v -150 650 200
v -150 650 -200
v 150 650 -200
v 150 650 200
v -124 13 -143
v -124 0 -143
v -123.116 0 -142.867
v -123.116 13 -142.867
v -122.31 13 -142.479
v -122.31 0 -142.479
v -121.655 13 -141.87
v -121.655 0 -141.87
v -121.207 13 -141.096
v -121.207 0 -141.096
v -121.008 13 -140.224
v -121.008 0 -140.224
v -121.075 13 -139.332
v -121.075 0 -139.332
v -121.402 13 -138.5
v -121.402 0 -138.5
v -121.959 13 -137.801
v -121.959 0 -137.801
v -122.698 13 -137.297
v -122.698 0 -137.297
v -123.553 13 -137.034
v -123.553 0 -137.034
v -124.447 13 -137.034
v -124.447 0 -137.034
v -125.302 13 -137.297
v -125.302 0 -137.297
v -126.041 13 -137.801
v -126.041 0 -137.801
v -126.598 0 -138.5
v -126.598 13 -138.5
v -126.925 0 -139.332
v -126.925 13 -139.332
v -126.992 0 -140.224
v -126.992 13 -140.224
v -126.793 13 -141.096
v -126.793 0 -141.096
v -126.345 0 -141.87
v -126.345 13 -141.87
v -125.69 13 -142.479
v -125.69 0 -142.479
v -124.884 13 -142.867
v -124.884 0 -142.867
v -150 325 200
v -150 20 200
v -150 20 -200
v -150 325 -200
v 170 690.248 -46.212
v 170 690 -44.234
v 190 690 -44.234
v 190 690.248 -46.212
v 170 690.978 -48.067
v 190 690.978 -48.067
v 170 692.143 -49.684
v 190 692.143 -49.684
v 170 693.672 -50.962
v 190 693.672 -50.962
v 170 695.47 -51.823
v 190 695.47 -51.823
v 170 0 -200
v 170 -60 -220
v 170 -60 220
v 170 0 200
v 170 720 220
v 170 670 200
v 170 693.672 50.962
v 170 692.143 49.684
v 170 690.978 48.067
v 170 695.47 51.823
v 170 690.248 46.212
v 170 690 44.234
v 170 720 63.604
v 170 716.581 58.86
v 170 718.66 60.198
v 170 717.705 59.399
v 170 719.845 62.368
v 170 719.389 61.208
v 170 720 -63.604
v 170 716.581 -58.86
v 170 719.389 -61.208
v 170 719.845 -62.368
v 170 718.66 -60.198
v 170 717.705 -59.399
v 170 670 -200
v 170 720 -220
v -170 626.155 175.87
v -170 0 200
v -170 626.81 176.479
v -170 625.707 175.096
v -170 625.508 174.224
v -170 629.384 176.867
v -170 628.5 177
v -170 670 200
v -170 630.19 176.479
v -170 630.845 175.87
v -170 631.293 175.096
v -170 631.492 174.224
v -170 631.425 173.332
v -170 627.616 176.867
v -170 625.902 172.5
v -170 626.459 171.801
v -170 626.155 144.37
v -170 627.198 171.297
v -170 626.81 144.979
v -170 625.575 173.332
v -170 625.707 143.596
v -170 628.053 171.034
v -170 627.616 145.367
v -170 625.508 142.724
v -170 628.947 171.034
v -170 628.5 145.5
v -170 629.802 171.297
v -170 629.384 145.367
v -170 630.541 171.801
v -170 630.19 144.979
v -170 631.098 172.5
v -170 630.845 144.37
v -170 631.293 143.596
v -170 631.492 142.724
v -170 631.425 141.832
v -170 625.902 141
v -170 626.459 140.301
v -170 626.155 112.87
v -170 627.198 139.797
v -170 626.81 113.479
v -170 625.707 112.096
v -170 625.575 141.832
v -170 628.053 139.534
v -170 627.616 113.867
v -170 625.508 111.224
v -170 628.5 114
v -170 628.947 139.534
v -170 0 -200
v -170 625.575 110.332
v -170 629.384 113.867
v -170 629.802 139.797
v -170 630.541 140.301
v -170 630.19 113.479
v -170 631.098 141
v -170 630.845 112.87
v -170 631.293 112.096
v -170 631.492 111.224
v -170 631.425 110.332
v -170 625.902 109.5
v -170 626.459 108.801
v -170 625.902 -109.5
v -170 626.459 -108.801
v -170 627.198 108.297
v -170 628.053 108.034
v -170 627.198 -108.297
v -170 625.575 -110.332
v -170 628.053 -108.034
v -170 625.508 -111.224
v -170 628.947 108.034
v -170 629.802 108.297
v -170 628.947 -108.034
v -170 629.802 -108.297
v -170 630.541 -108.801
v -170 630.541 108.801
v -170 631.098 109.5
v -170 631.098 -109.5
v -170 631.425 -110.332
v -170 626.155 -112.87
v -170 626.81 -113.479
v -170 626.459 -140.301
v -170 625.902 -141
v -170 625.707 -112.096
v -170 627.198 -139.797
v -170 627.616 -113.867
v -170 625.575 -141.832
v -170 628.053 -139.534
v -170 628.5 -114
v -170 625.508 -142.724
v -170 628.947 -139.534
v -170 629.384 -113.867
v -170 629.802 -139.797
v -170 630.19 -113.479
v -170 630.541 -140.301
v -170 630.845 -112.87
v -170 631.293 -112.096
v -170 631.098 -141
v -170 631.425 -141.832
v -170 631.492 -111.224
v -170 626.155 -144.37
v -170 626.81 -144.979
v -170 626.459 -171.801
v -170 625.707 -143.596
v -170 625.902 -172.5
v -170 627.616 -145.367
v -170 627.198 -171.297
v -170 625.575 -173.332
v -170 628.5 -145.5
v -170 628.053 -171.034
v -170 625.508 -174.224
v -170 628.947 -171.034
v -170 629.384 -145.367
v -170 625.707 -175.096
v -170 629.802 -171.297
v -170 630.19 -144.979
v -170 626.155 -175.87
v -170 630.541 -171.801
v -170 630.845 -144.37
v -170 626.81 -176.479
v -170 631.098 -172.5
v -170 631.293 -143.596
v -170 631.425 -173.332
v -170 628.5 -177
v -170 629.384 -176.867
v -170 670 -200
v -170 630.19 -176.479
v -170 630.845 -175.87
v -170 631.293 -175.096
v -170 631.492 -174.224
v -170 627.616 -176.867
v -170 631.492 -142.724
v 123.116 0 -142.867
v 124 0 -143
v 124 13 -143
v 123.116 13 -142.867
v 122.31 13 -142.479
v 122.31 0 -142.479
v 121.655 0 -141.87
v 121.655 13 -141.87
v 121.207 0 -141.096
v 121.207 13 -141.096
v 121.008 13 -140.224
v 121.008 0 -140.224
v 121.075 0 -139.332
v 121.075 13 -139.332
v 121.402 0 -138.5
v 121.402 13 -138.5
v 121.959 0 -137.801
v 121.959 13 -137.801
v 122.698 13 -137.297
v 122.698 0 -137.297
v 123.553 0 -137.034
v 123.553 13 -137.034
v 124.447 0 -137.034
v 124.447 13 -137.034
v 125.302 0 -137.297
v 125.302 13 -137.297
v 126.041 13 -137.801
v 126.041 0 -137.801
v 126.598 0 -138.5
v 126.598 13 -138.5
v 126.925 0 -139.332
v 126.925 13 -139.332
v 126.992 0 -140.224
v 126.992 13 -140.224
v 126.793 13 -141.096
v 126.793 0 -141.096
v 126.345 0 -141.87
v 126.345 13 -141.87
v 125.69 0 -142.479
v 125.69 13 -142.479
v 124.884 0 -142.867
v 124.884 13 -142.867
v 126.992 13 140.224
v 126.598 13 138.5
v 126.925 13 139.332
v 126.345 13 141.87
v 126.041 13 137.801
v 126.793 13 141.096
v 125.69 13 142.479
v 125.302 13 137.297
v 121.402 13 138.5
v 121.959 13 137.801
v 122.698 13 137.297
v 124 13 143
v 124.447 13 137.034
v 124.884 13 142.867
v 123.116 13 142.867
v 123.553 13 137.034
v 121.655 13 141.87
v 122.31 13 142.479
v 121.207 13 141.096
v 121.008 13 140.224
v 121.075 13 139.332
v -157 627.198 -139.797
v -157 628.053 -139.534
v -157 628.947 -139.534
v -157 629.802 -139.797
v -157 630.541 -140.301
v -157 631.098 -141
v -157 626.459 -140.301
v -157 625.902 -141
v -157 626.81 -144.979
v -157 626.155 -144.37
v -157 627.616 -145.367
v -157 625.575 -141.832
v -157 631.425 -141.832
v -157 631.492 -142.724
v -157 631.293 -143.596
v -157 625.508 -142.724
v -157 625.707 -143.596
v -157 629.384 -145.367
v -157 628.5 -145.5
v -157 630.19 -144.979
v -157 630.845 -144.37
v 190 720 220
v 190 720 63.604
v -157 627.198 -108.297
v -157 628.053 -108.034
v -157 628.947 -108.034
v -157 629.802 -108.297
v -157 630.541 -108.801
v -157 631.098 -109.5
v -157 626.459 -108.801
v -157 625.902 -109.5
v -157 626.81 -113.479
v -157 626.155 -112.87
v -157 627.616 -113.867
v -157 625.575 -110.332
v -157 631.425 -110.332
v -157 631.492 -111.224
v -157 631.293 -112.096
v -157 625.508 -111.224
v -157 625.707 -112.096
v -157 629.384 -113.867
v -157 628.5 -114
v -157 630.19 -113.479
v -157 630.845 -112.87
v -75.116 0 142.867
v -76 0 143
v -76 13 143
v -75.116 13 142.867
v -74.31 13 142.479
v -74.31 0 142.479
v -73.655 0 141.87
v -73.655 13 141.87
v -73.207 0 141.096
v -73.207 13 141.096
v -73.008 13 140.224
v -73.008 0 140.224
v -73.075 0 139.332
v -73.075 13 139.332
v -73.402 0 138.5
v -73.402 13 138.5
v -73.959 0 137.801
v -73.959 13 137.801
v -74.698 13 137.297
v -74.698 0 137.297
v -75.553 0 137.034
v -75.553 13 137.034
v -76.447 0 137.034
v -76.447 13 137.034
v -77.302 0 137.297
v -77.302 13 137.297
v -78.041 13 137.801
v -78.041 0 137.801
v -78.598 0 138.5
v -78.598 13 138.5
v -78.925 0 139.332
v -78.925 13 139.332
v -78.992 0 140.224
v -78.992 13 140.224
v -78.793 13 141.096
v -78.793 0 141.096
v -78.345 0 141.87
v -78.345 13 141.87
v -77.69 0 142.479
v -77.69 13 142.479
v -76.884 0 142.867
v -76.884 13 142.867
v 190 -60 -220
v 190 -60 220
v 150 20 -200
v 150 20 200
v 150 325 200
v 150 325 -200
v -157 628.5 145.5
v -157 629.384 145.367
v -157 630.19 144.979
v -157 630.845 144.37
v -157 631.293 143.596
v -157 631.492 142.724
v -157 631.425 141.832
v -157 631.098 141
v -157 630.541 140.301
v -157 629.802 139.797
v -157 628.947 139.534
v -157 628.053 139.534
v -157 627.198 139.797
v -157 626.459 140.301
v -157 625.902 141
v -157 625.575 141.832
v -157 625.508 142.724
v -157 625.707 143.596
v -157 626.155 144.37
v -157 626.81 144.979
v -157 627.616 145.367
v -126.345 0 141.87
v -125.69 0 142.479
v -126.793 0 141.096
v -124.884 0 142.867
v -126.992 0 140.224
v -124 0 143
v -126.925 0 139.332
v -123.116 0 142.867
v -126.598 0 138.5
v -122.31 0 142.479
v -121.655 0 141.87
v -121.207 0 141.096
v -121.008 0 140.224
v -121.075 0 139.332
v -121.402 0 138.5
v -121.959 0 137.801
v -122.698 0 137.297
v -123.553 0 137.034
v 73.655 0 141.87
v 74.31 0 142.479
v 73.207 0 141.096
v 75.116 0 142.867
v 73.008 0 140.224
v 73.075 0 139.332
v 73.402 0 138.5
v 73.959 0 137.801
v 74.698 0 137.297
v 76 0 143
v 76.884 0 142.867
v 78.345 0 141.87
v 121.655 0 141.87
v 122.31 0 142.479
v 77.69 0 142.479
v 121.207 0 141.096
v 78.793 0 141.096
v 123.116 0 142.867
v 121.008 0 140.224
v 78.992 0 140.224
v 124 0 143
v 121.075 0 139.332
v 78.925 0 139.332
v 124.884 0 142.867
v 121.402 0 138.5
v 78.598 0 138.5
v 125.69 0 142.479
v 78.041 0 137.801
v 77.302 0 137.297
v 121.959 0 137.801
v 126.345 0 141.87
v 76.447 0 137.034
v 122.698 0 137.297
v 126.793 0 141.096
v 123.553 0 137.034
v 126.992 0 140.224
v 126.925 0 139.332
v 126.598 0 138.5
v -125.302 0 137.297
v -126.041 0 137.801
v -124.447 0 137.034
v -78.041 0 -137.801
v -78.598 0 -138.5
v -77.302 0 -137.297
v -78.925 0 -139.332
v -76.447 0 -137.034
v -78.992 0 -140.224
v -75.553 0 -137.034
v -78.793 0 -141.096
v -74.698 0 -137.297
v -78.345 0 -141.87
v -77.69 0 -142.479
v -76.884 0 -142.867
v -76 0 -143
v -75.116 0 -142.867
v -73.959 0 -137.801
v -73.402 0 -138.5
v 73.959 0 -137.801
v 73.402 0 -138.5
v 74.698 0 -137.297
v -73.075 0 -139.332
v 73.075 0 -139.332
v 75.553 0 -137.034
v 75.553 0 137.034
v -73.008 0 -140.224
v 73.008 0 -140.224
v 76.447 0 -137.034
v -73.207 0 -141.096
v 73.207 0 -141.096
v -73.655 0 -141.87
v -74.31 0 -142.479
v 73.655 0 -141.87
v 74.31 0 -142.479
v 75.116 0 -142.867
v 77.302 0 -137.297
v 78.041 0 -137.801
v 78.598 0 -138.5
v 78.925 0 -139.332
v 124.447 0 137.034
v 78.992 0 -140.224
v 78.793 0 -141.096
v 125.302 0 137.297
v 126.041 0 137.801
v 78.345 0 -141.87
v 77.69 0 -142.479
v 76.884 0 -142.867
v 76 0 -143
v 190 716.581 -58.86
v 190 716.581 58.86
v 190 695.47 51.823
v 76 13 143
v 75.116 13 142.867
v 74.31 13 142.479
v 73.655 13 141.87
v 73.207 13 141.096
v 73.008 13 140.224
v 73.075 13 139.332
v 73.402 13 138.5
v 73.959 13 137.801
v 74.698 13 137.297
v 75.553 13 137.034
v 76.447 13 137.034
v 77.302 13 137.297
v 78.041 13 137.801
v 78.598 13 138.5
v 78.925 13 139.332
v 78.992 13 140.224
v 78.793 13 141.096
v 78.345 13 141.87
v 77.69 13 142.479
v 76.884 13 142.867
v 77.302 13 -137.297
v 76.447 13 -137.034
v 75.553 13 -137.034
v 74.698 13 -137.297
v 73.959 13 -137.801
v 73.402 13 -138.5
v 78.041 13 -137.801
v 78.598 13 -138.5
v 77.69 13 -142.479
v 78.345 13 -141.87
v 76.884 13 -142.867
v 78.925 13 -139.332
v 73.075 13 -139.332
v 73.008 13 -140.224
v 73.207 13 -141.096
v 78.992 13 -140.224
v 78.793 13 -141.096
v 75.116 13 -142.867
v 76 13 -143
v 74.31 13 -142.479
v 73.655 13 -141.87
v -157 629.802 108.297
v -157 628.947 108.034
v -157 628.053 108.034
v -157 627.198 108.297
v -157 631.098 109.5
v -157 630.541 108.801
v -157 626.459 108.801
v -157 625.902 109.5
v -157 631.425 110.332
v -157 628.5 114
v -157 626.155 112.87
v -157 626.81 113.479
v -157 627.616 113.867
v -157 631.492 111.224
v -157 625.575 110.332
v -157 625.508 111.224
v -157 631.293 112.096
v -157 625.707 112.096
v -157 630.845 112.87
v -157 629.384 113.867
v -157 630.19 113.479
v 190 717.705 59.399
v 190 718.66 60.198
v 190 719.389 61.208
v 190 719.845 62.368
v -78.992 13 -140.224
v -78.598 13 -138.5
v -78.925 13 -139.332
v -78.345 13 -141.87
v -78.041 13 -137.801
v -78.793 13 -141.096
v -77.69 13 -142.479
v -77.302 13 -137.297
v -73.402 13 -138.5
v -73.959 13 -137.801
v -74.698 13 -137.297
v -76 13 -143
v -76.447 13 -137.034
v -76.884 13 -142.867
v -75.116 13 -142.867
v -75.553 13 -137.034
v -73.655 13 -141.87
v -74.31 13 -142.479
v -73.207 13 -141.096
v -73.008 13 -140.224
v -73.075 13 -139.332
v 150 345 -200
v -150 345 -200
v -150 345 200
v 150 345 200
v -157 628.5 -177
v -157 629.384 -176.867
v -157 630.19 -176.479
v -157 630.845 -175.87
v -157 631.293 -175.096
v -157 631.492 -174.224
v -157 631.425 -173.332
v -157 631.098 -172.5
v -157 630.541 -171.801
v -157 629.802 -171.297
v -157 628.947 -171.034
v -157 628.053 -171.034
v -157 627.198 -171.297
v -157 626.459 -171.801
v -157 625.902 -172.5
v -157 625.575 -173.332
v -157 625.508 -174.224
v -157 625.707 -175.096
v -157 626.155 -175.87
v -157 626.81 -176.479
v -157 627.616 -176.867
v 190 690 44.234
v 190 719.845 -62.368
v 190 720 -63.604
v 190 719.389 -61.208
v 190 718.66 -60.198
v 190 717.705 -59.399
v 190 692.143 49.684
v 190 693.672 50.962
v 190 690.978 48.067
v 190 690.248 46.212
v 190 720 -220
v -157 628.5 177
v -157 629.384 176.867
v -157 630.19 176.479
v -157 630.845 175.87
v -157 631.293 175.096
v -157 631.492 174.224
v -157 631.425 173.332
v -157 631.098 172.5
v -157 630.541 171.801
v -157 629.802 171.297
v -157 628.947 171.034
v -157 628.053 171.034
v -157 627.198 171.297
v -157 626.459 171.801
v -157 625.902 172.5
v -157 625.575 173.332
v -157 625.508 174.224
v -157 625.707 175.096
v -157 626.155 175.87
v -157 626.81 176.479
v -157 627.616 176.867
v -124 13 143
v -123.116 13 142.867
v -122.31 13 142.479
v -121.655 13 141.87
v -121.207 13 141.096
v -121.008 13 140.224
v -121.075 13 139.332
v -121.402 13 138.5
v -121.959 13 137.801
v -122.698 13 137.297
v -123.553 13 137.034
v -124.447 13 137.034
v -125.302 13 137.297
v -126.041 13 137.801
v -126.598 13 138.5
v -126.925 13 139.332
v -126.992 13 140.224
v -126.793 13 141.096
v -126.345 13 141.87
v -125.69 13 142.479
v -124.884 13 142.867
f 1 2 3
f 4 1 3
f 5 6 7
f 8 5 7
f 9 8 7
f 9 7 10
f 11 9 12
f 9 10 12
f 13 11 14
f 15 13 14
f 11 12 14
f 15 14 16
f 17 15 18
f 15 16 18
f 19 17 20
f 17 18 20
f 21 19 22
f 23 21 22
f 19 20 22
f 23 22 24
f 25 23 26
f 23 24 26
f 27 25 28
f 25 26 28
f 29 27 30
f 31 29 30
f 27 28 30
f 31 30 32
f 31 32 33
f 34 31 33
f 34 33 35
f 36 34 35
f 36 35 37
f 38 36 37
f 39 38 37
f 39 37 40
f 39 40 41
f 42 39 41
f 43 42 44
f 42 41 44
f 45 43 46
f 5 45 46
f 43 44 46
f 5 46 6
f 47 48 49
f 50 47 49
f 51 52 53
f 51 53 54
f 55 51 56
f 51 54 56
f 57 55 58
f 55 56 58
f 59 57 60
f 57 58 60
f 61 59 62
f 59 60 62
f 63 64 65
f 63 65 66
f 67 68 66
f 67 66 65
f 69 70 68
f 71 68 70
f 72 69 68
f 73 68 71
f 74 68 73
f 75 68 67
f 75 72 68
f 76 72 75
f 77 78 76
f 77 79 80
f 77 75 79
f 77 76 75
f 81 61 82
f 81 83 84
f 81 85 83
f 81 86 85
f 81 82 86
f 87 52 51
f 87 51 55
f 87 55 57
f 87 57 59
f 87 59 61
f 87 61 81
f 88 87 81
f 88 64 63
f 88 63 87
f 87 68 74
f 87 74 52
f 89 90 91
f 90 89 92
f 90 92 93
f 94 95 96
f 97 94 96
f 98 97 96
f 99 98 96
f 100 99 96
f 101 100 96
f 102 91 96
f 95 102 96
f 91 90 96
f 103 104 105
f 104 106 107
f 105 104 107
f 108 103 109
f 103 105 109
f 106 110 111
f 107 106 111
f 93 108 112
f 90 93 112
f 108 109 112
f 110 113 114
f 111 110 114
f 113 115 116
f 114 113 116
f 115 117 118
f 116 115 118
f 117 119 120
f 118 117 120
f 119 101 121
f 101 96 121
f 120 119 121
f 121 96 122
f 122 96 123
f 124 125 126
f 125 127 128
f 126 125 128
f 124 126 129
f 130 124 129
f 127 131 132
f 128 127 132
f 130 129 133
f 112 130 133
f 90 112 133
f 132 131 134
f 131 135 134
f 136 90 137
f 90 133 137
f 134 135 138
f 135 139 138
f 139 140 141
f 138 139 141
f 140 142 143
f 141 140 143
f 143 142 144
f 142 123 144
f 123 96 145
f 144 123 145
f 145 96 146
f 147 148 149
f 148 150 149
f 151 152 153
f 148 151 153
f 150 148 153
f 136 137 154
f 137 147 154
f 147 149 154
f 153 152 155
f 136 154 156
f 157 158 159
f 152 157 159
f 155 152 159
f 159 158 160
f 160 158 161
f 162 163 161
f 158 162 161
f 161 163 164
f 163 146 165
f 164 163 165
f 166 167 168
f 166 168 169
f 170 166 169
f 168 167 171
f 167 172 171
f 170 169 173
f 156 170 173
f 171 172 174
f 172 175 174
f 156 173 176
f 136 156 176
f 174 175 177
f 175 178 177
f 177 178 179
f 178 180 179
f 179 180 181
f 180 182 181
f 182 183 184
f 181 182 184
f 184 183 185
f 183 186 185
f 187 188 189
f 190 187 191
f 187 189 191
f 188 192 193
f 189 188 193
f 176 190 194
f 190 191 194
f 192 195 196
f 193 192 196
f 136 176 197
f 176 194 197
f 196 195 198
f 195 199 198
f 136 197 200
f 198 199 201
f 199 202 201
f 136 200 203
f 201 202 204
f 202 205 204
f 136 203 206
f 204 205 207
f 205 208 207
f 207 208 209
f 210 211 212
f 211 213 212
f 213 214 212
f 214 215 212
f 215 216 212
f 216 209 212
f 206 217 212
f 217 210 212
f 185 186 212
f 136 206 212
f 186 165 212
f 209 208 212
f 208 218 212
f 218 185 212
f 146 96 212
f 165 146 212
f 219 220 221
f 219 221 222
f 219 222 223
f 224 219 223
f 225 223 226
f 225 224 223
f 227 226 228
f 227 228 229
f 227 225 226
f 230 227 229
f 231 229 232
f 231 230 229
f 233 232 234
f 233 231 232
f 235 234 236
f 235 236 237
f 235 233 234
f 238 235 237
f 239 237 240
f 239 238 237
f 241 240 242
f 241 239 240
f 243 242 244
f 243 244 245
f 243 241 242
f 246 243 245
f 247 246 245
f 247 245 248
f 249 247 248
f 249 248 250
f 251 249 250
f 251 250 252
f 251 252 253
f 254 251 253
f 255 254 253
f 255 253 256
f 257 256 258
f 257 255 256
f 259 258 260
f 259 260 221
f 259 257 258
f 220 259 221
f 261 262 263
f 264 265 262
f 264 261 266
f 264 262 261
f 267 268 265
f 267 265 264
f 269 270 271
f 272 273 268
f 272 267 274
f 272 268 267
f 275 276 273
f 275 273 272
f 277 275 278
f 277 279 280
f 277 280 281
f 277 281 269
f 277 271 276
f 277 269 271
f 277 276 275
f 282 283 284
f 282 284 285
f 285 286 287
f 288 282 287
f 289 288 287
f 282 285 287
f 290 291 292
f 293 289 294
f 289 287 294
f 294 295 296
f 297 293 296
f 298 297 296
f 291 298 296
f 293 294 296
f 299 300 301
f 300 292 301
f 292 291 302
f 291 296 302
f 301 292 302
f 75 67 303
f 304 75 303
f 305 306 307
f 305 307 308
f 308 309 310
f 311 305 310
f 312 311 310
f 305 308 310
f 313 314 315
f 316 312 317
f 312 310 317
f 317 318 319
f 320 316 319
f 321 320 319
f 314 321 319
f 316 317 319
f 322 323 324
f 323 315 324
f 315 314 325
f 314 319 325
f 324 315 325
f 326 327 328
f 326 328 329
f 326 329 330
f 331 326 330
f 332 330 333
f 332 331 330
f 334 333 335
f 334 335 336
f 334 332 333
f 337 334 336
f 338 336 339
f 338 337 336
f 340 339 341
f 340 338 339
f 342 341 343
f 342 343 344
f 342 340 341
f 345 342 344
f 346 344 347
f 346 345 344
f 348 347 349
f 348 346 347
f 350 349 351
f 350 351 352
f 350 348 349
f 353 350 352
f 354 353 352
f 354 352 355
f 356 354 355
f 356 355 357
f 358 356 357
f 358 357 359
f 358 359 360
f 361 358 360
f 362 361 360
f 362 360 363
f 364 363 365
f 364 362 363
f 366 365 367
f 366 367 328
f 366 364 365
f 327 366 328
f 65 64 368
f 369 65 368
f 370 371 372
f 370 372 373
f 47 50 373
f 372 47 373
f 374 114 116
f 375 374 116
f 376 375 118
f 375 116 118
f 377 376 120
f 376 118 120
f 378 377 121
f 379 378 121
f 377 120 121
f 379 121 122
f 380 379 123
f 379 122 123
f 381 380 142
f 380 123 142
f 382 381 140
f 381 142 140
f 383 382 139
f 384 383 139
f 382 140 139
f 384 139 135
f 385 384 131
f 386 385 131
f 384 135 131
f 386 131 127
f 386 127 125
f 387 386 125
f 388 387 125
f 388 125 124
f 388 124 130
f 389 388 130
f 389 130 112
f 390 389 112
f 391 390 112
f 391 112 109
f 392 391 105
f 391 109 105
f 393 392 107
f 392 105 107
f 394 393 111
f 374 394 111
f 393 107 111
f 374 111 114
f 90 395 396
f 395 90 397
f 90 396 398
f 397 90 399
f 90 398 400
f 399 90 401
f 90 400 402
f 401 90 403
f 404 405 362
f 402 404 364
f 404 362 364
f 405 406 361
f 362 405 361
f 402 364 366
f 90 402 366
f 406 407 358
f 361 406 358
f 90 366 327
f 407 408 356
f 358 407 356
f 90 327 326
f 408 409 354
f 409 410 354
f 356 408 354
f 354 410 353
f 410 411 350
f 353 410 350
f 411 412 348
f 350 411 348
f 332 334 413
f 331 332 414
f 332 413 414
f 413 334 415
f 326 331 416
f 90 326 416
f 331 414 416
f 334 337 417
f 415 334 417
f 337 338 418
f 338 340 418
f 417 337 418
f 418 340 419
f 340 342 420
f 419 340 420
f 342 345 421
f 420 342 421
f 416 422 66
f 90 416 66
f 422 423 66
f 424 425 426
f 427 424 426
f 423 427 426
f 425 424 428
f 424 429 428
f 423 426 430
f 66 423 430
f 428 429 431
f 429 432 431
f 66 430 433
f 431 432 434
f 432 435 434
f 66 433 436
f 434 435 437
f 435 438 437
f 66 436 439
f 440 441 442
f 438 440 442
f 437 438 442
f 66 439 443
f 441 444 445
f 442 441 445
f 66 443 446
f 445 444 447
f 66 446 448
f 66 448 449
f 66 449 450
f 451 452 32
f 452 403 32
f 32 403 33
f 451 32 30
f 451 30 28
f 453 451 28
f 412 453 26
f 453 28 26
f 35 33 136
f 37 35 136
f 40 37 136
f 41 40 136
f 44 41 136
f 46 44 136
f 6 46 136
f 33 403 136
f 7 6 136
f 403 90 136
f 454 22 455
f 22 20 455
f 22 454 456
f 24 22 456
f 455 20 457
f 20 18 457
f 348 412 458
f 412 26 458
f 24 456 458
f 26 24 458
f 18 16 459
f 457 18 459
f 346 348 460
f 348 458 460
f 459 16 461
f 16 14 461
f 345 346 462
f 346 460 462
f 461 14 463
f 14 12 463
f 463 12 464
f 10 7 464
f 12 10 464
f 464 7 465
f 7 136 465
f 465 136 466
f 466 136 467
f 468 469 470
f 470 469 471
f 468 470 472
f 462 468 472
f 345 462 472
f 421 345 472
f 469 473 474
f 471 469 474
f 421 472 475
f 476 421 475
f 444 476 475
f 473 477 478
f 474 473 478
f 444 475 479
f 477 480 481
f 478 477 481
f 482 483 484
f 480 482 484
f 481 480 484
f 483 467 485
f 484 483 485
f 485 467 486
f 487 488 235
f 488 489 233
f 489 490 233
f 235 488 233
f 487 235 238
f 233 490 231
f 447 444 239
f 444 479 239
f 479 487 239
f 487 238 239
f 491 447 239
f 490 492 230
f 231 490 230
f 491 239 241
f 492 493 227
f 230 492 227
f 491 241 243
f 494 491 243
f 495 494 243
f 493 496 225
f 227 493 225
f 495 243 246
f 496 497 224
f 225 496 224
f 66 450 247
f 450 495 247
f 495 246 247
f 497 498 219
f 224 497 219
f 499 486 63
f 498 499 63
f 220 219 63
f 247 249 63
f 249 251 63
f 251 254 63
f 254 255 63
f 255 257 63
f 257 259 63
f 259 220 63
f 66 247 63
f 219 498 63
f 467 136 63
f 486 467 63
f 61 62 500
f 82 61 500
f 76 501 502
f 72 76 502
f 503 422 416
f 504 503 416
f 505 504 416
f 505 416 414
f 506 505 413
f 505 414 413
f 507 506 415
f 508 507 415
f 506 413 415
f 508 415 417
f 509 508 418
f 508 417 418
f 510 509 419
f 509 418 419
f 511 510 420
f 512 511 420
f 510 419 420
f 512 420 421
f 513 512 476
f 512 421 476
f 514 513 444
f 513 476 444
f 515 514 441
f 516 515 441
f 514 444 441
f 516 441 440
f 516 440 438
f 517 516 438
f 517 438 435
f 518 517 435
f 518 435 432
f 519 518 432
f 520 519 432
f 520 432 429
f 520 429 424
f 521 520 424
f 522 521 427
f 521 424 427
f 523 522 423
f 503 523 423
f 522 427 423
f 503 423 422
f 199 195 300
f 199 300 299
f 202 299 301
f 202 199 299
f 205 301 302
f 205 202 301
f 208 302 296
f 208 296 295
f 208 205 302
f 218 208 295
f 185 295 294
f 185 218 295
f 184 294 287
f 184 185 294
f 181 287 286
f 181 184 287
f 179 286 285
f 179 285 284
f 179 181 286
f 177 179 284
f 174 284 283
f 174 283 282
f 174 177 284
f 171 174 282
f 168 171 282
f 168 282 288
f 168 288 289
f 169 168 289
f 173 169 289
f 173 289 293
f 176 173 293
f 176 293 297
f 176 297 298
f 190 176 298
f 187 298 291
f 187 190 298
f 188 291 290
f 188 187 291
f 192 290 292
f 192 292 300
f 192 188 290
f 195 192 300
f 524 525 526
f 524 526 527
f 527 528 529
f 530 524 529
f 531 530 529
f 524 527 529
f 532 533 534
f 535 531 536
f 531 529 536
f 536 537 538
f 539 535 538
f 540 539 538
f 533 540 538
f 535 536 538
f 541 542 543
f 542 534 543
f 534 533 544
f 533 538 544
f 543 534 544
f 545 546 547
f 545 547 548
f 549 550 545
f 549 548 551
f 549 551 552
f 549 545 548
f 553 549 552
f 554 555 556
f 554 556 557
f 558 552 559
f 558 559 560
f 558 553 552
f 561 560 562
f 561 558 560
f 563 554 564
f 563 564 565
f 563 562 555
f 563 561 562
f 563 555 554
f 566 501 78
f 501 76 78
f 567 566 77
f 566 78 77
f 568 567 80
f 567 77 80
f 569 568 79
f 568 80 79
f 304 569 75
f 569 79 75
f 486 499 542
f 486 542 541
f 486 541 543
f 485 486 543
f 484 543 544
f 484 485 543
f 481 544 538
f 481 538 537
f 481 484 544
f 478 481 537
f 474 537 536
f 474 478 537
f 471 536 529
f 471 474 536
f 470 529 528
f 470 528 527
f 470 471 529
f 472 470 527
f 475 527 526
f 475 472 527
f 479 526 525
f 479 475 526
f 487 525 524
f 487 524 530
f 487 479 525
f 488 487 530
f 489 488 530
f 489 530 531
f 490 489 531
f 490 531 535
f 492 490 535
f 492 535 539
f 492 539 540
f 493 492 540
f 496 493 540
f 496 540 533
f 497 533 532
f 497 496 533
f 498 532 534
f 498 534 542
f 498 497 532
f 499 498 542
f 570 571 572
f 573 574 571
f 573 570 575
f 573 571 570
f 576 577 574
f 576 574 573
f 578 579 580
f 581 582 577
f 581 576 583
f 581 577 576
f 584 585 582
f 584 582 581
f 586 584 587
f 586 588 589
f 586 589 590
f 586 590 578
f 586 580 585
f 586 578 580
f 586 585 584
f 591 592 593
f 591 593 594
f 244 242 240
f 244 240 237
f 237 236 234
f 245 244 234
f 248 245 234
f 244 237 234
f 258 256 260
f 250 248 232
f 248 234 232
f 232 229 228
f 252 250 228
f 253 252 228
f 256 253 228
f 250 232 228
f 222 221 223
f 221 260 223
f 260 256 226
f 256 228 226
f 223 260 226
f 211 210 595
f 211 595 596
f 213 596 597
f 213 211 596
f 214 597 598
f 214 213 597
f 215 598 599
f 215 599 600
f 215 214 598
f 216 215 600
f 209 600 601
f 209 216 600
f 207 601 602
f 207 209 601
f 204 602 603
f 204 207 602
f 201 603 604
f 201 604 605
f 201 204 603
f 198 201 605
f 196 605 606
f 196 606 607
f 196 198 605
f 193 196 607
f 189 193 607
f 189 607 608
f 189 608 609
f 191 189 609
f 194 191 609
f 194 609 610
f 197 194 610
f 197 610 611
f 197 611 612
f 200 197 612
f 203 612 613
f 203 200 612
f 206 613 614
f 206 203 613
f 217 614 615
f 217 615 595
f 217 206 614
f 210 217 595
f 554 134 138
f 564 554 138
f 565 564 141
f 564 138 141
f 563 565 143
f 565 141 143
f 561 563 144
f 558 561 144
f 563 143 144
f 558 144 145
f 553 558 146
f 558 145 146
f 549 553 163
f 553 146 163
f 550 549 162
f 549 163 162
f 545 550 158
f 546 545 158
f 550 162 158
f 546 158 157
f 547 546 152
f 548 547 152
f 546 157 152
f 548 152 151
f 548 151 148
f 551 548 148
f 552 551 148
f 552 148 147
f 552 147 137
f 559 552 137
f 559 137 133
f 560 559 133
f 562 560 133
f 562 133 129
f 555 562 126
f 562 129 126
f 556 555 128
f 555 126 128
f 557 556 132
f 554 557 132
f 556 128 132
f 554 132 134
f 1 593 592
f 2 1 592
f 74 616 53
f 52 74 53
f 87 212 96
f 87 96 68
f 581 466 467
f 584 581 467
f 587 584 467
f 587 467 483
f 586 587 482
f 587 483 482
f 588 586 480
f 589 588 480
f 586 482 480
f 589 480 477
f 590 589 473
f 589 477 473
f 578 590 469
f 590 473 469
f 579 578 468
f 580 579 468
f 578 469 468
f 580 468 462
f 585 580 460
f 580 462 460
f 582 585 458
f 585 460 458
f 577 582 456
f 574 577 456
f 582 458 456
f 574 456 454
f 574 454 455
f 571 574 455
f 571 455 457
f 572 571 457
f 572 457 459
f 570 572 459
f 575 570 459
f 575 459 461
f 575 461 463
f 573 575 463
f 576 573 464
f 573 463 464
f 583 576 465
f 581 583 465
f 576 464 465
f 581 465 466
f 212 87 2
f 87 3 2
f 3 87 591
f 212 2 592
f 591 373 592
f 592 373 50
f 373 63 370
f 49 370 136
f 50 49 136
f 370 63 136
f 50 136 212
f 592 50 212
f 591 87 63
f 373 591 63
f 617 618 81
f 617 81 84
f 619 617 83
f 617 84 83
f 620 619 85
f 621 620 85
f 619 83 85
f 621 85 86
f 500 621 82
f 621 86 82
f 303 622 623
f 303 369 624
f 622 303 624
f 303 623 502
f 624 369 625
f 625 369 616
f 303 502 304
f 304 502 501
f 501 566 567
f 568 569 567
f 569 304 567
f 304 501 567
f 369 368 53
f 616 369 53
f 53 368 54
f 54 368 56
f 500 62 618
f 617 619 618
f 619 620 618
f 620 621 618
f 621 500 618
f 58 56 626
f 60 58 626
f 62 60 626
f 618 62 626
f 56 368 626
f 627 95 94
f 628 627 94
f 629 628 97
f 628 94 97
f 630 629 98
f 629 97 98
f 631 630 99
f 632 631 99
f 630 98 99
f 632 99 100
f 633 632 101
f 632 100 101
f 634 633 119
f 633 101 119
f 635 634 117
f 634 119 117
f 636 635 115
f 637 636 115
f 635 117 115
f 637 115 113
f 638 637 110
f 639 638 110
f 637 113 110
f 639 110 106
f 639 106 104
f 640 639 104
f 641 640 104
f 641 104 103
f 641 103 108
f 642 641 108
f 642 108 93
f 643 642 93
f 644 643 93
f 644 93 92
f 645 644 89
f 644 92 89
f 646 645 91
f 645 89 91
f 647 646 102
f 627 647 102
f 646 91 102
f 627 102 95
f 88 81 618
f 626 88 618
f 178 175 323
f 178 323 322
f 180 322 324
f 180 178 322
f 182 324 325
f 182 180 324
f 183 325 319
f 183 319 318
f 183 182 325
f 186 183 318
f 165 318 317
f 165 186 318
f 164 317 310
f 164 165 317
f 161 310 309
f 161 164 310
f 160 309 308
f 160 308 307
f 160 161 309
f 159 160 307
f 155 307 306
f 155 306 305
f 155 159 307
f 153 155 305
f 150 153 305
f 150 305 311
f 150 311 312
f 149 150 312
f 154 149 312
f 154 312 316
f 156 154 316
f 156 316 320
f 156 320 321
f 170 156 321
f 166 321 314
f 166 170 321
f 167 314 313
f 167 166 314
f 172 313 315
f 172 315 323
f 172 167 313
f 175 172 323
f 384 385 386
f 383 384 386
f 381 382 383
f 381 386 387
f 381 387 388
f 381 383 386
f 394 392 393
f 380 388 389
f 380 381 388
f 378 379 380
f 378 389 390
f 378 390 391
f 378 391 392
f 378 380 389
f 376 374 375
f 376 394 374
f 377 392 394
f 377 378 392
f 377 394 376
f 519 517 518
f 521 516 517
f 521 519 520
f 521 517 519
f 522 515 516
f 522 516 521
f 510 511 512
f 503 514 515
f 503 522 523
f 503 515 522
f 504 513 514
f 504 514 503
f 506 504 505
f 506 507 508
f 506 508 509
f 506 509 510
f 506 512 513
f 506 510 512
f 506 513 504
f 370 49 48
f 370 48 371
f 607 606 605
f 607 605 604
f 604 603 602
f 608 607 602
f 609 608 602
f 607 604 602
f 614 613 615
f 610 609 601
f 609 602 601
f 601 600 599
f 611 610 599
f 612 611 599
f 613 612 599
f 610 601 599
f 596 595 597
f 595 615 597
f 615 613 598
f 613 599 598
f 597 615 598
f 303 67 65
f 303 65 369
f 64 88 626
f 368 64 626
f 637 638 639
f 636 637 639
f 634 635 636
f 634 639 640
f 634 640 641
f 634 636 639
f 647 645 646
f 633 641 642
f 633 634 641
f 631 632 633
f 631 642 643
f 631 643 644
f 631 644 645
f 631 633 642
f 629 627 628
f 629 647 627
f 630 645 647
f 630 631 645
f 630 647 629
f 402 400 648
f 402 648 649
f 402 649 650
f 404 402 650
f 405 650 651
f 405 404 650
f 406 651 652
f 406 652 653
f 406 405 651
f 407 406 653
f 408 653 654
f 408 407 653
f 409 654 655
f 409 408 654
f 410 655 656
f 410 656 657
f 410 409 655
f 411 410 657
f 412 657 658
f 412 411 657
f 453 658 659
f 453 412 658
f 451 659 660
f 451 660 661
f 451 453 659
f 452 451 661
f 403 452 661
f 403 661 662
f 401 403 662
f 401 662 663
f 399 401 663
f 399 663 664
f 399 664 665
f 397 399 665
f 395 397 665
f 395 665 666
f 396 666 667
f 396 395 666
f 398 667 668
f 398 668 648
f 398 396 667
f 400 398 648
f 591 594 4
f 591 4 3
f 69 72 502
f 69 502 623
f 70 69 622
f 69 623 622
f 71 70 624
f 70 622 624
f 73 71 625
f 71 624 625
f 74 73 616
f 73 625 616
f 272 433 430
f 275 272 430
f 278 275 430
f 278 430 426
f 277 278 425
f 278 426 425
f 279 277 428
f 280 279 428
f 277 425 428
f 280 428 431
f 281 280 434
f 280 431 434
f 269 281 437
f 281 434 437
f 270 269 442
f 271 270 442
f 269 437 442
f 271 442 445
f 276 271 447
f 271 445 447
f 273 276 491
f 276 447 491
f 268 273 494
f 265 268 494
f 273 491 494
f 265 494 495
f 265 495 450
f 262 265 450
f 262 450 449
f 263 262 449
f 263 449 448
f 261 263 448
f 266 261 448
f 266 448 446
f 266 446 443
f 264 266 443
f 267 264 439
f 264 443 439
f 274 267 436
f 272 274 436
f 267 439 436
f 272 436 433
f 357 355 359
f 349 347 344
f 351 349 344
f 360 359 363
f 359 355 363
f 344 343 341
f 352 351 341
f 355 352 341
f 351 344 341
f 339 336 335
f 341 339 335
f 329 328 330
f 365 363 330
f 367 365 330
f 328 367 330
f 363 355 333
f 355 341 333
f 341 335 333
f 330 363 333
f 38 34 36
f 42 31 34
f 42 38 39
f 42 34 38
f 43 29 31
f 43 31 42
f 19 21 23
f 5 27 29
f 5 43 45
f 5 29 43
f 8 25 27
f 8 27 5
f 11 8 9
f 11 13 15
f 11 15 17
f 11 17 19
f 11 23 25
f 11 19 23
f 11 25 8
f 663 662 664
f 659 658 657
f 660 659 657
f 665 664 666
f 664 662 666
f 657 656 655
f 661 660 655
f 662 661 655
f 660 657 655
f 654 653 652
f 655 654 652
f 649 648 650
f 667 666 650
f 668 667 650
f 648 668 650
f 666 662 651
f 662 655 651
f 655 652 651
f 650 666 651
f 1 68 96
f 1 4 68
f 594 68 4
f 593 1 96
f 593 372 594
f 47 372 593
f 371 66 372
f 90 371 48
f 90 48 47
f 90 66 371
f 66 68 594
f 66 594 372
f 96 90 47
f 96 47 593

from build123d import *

# Parameters (mm, degrees)
SKETCH1_W                = 340
SKETCH1_H                = 400
BOSS_EXTRUDE1_DEPTH      = 20
SKETCH2_W                = 20
SKETCH2_H                = 400
BOSS_EXTRUDE2_DEPTH      = 630
SKETCH3_W                = 300
SKETCH3_H                = 400
BOSS_EXTRUDE3_DEPTH      = 10
BOSS_EXTRUDE4_DEPTH      = 20
BOSS_EXTRUDE4_DEPTH_BACK = 420
SKETCH8_W                = 20
SKETCH8_H                = 780
CUT_EXTRUDE4_DEPTH       = 20
FILLET1_R                = 5
SKETCH10_R               = 3
CUT_EXTRUDE5_DEPTH       = 13
SKETCH11_R               = 3
CUT_EXTRUDE6_DEPTH       = 13
MIRROR5_COPY_1_SKETCH_R  = 3
MIRROR5_COPY_1_DEPTH     = 13


with BuildPart() as part:
    # Sketch1 → Boss-Extrude1 (new body)
    with BuildSketch(Plane(origin=(0, 0, 0), x_dir=(1, 0, 0), z_dir=(0, 1, 0))):
        Rectangle(SKETCH1_W, SKETCH1_H)
    boss_extrude1 = extrude(amount=BOSS_EXTRUDE1_DEPTH)

    # Sketch2 → Boss-Extrude2 (add)
    with BuildSketch(Plane(origin=(0, 20, 0), x_dir=(1, 0, 0), z_dir=(0, 1, 0))):
        with Locations((-160, 0)):
            Rectangle(SKETCH2_W, SKETCH2_H)
    boss_extrude2 = extrude(amount=BOSS_EXTRUDE2_DEPTH)

    # Sketch3 → Boss-Extrude3 (add, symmetric)
    with BuildSketch(Plane(origin=(0, 335, 0), x_dir=(1, 0, 0), z_dir=(0, 1, 0))):
        Rectangle(SKETCH3_W, SKETCH3_H)
    extrude(amount=BOSS_EXTRUDE3_DEPTH, both=True)

    # Mirror1: Boss-Extrude1 across plane
    add(boss_extrude1.mirror(Plane.ZX.offset(335)))

    # Mirror2: Boss-Extrude2 across plane
    add(boss_extrude2.mirror(Plane(origin=(0, 0, 0), x_dir=(0, 0, 1), z_dir=(1, 0, 0))))

    # Sketch8 → Boss-Extrude4 (add, two sides: drawn at the far end of the back side and taken through both)
    with BuildSketch(Plane.XY.offset(200).offset(-BOSS_EXTRUDE4_DEPTH_BACK)):
        with Locations((180, 330)):
            Rectangle(SKETCH8_W, SKETCH8_H)
    extrude(amount=BOSS_EXTRUDE4_DEPTH + BOSS_EXTRUDE4_DEPTH_BACK)

    # Sketch9 → Cut-Extrude4 (cut)
    with BuildSketch(Plane(origin=(190, 0, 0), x_dir=(0, 0, -1), z_dir=(1, 0, 0))):
        with BuildLine():
            Line((-60, 720), (-51.823392624, 695.470177872))
            ThreePointArc((-51.823392624, 695.470177872), (-48.911608517, 691.510062519), (-44.23392624, 690))
            Line((-44.23392624, 690), (44.23392624, 690))
            ThreePointArc((44.23392624, 690), (48.911608517, 691.510062519), (51.823392624, 695.470177872))
            Line((51.823392624, 695.470177872), (60, 720))
            Line((60, 720), (-60, 720))
        make_face()
    extrude(amount=-CUT_EXTRUDE4_DEPTH, mode=Mode.SUBTRACT)

    # Fillet1
    fillet1_edges = [part.edges().sort_by_distance(p)[0] for p in [
        (180, 720, 60),
        (180, 720, -60),
    ]]
    fillet(fillet1_edges, radius=FILLET1_R)

    # Sketch10 → Cut-Extrude5 (cut)
    with BuildSketch(Plane.ZY.offset(170)):
        with Locations((174, 628.5)):
            Circle(SKETCH10_R)
        with Locations((142.5, 628.5)):
            Circle(SKETCH10_R)
        with Locations((111, 628.5)):
            Circle(SKETCH10_R)
    cut_extrude5 = extrude(amount=-CUT_EXTRUDE5_DEPTH, mode=Mode.SUBTRACT)

    # Mirror3: Cut-Extrude5 across plane
    add(cut_extrude5.mirror(Plane.XY), mode=Mode.SUBTRACT)

    # Sketch11 → Cut-Extrude6 (cut)
    with BuildSketch(Plane.XZ):
        with Locations(Location((-124, -140, 0), (0, 0, 270))):
            Circle(SKETCH11_R)
        with Locations(Location((-76, -140, 0), (0, 0, 270))):
            Circle(SKETCH11_R)
    cut_extrude6 = extrude(amount=-CUT_EXTRUDE6_DEPTH, mode=Mode.SUBTRACT)

    # Mirror4: Cut-Extrude6 across plane
    add(cut_extrude6.mirror(Plane(origin=(0, 0, 0), x_dir=(0, 0, 1), z_dir=(1, 0, 0))), mode=Mode.SUBTRACT)

    # Mirror5: Cut-Extrude6 across plane
    add(cut_extrude6.mirror(Plane.XY), mode=Mode.SUBTRACT)

    # Mirror5 copy 1 sketch → Mirror5 copy 1 (cut)
    with BuildSketch(Plane(origin=(0, 0, 0), x_dir=(-1, 0, 0), z_dir=(0, -1, 0))):
        with Locations(Location((-124, -140, 0), (0, 0, 270))):
            Circle(MIRROR5_COPY_1_SKETCH_R)
        with Locations(Location((-76, -140, 0), (0, 0, 270))):
            Circle(MIRROR5_COPY_1_SKETCH_R)
    extrude(amount=-MIRROR5_COPY_1_DEPTH, mode=Mode.SUBTRACT)


solid = part.part
